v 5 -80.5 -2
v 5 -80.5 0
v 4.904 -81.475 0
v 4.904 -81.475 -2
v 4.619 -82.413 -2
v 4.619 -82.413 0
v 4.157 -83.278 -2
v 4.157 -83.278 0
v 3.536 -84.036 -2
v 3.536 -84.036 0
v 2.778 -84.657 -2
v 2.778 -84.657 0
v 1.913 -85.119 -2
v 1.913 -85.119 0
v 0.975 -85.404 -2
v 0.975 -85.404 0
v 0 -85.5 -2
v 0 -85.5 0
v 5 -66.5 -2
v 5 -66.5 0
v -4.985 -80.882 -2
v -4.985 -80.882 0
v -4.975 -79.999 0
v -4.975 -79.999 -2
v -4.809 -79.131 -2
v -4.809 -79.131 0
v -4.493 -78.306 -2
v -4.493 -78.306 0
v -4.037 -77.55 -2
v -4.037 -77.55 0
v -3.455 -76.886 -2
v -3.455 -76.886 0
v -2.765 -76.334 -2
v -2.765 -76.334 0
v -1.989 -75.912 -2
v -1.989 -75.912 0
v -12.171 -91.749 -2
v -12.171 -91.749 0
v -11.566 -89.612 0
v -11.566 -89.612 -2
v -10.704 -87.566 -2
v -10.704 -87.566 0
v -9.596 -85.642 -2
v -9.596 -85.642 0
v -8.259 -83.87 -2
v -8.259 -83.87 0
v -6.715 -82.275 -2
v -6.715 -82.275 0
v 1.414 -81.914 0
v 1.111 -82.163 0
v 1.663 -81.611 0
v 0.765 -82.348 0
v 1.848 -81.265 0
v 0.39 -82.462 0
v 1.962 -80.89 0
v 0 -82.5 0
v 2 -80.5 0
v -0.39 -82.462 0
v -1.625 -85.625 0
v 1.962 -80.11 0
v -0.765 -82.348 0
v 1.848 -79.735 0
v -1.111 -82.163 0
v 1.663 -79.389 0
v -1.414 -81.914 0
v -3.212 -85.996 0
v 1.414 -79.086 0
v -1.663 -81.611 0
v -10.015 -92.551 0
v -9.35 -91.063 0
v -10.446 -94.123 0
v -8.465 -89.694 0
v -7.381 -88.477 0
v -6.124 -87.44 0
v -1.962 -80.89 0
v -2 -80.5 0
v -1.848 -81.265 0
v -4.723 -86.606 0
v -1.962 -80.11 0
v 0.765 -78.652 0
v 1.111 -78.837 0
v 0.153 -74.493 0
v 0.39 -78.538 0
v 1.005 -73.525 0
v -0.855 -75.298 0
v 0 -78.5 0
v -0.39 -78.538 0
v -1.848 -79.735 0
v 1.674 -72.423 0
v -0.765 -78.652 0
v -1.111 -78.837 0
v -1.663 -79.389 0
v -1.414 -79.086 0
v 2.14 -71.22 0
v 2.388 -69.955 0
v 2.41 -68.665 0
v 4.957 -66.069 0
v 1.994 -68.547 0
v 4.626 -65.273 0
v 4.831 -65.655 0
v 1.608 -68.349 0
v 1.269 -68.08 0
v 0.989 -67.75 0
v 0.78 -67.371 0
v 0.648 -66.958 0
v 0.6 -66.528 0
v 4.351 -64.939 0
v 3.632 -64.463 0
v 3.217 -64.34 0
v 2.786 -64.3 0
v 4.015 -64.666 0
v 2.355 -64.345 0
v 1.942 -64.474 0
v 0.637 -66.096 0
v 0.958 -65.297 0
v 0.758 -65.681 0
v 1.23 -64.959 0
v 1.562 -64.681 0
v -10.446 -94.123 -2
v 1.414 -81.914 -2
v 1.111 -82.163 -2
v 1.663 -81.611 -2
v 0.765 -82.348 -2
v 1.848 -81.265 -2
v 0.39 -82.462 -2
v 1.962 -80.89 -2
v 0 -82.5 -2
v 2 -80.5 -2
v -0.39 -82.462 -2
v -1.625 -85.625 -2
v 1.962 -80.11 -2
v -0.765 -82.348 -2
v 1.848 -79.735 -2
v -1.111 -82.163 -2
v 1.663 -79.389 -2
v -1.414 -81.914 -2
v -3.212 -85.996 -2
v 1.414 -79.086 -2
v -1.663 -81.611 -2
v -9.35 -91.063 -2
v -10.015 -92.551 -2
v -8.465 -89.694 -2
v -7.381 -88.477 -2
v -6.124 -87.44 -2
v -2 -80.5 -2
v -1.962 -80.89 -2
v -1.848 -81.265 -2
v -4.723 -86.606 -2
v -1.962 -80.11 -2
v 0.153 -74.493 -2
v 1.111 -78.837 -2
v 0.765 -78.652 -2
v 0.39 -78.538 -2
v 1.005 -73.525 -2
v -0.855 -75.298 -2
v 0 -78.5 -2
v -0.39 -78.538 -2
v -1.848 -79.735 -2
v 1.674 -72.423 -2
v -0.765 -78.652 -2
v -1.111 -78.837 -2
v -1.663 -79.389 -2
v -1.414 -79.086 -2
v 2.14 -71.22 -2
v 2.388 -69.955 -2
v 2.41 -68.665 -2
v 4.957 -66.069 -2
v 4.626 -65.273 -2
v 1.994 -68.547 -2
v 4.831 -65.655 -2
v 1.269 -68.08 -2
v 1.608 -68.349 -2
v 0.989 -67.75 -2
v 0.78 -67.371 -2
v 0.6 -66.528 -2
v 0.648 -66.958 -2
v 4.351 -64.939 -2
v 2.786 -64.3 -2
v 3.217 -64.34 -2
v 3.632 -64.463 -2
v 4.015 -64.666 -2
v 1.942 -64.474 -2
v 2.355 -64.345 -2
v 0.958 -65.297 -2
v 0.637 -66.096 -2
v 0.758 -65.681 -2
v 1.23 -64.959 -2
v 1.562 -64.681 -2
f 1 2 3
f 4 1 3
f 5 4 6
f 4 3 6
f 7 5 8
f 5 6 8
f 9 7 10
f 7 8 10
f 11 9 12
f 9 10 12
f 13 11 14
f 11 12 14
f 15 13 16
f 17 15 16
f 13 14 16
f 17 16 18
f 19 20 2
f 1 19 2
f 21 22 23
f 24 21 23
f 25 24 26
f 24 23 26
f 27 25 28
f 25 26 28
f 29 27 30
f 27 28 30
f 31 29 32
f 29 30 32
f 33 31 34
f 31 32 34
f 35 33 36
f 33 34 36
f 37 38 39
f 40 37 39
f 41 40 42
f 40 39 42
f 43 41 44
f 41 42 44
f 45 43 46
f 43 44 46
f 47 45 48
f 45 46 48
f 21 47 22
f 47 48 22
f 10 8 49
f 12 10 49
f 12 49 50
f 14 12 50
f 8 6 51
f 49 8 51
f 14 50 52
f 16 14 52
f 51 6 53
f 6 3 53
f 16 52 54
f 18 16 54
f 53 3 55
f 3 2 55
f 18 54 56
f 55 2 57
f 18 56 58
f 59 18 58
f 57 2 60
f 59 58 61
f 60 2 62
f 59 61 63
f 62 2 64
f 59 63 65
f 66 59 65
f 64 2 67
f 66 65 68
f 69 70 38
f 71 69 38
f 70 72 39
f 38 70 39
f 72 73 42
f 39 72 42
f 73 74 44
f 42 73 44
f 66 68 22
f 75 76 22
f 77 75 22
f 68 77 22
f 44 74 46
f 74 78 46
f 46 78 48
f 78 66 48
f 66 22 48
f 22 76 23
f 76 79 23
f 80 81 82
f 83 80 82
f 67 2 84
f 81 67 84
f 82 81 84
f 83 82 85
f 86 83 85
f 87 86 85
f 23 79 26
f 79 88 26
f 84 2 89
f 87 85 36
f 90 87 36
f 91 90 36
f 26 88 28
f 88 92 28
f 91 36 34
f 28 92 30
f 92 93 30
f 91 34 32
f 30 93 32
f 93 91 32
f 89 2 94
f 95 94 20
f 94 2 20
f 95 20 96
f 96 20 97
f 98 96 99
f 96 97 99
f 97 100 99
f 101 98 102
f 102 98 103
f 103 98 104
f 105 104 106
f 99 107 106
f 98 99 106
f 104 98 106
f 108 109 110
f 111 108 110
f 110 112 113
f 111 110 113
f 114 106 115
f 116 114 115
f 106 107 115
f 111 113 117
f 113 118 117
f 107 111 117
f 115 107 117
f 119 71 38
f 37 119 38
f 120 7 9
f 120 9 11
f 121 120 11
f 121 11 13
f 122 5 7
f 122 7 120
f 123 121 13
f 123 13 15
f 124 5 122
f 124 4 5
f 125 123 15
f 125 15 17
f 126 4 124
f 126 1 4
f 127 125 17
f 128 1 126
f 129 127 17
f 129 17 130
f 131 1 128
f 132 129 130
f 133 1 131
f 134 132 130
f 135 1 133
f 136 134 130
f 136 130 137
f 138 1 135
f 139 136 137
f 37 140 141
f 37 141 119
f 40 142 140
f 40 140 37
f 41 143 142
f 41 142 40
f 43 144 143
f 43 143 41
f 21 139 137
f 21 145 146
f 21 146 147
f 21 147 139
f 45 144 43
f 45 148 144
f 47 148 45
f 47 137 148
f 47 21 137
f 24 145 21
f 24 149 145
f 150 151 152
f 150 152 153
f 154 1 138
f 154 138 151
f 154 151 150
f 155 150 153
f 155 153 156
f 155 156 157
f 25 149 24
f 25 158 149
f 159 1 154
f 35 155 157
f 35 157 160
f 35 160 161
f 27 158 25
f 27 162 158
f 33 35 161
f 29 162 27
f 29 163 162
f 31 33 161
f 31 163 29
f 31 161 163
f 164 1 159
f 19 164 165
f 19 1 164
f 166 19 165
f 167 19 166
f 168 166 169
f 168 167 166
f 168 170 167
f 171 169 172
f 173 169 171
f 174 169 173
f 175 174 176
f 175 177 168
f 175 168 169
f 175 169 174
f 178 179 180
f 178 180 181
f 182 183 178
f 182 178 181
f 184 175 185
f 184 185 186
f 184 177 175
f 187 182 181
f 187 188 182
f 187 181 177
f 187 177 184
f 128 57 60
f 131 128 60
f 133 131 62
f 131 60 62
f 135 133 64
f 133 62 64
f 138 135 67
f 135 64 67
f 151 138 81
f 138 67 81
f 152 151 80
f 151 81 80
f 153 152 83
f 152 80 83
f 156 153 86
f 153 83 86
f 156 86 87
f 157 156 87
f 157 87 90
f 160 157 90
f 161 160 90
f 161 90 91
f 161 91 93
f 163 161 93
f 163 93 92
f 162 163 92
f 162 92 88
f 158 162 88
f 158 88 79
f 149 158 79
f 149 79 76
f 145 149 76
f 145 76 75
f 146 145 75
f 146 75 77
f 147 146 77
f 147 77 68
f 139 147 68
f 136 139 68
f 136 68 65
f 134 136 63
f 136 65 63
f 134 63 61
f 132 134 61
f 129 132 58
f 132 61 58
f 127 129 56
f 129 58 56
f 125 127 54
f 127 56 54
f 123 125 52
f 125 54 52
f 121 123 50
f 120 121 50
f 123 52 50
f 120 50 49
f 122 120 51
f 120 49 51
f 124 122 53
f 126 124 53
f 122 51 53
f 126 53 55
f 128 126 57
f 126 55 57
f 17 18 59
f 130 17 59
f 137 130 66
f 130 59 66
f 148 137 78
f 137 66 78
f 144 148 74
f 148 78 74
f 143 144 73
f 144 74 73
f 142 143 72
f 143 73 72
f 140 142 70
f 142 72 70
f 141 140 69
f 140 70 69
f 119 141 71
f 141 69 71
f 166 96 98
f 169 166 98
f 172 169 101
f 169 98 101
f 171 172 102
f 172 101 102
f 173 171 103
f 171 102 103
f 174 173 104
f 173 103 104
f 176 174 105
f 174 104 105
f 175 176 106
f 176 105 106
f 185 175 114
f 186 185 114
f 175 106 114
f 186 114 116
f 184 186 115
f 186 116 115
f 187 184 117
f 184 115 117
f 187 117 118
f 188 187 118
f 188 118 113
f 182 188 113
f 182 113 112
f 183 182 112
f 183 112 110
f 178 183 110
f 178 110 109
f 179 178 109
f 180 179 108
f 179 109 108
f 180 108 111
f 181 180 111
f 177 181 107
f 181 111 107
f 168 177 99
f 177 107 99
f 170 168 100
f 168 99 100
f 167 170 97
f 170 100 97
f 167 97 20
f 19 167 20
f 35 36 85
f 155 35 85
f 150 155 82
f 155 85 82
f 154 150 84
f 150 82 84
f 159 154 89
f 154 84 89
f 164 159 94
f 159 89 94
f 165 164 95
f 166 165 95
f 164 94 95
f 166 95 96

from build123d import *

# Parameters (mm, degrees)
BOSS_EXTRUDE1_DEPTH = 2
SKETCH3_R           = 2
CUT_EXTRUDE1_DEPTH  = 3


with BuildPart() as part:
    # Sketch2 → Boss-Extrude1 (new body)
    with BuildSketch(Plane.XY):
        with BuildLine():
            Line((-10.445641875, -94.122807376), (-12.17064978, -91.748537682))
            ThreePointArc((-12.17064978, -91.748537682), (-9.595543925, -85.642489446), (-4.985379129, -80.882092847))
            ThreePointArc((-4.985379129, -80.882092847), (-4.281750191, -77.918021049), (-1.988595944, -75.912464041))
            ThreePointArc((-1.988595944, -75.912464041), (1.364054662, -72.988805292), (2.410188275, -68.665189788))
            ThreePointArc((2.410188275, -68.665189788), (1.388898621, -64.812163249), (5, -66.5))
            Line((5, -66.5), (5, -80.5))
            ThreePointArc((5, -80.5), (3.535533906, -84.035533906), (0, -85.5))
            ThreePointArc((0, -85.5), (-6.77244862, -87.934189562), (-10.445641875, -94.122807376))
        make_face()
    extrude(amount=-BOSS_EXTRUDE1_DEPTH)

    # Sketch3 → Cut-Extrude1 (cut, through all)
    with BuildSketch(Plane.XY):
        with Locations((0, -80.5)):
            Circle(SKETCH3_R)
    extrude(amount=-CUT_EXTRUDE1_DEPTH, mode=Mode.SUBTRACT)


solid = part.part
